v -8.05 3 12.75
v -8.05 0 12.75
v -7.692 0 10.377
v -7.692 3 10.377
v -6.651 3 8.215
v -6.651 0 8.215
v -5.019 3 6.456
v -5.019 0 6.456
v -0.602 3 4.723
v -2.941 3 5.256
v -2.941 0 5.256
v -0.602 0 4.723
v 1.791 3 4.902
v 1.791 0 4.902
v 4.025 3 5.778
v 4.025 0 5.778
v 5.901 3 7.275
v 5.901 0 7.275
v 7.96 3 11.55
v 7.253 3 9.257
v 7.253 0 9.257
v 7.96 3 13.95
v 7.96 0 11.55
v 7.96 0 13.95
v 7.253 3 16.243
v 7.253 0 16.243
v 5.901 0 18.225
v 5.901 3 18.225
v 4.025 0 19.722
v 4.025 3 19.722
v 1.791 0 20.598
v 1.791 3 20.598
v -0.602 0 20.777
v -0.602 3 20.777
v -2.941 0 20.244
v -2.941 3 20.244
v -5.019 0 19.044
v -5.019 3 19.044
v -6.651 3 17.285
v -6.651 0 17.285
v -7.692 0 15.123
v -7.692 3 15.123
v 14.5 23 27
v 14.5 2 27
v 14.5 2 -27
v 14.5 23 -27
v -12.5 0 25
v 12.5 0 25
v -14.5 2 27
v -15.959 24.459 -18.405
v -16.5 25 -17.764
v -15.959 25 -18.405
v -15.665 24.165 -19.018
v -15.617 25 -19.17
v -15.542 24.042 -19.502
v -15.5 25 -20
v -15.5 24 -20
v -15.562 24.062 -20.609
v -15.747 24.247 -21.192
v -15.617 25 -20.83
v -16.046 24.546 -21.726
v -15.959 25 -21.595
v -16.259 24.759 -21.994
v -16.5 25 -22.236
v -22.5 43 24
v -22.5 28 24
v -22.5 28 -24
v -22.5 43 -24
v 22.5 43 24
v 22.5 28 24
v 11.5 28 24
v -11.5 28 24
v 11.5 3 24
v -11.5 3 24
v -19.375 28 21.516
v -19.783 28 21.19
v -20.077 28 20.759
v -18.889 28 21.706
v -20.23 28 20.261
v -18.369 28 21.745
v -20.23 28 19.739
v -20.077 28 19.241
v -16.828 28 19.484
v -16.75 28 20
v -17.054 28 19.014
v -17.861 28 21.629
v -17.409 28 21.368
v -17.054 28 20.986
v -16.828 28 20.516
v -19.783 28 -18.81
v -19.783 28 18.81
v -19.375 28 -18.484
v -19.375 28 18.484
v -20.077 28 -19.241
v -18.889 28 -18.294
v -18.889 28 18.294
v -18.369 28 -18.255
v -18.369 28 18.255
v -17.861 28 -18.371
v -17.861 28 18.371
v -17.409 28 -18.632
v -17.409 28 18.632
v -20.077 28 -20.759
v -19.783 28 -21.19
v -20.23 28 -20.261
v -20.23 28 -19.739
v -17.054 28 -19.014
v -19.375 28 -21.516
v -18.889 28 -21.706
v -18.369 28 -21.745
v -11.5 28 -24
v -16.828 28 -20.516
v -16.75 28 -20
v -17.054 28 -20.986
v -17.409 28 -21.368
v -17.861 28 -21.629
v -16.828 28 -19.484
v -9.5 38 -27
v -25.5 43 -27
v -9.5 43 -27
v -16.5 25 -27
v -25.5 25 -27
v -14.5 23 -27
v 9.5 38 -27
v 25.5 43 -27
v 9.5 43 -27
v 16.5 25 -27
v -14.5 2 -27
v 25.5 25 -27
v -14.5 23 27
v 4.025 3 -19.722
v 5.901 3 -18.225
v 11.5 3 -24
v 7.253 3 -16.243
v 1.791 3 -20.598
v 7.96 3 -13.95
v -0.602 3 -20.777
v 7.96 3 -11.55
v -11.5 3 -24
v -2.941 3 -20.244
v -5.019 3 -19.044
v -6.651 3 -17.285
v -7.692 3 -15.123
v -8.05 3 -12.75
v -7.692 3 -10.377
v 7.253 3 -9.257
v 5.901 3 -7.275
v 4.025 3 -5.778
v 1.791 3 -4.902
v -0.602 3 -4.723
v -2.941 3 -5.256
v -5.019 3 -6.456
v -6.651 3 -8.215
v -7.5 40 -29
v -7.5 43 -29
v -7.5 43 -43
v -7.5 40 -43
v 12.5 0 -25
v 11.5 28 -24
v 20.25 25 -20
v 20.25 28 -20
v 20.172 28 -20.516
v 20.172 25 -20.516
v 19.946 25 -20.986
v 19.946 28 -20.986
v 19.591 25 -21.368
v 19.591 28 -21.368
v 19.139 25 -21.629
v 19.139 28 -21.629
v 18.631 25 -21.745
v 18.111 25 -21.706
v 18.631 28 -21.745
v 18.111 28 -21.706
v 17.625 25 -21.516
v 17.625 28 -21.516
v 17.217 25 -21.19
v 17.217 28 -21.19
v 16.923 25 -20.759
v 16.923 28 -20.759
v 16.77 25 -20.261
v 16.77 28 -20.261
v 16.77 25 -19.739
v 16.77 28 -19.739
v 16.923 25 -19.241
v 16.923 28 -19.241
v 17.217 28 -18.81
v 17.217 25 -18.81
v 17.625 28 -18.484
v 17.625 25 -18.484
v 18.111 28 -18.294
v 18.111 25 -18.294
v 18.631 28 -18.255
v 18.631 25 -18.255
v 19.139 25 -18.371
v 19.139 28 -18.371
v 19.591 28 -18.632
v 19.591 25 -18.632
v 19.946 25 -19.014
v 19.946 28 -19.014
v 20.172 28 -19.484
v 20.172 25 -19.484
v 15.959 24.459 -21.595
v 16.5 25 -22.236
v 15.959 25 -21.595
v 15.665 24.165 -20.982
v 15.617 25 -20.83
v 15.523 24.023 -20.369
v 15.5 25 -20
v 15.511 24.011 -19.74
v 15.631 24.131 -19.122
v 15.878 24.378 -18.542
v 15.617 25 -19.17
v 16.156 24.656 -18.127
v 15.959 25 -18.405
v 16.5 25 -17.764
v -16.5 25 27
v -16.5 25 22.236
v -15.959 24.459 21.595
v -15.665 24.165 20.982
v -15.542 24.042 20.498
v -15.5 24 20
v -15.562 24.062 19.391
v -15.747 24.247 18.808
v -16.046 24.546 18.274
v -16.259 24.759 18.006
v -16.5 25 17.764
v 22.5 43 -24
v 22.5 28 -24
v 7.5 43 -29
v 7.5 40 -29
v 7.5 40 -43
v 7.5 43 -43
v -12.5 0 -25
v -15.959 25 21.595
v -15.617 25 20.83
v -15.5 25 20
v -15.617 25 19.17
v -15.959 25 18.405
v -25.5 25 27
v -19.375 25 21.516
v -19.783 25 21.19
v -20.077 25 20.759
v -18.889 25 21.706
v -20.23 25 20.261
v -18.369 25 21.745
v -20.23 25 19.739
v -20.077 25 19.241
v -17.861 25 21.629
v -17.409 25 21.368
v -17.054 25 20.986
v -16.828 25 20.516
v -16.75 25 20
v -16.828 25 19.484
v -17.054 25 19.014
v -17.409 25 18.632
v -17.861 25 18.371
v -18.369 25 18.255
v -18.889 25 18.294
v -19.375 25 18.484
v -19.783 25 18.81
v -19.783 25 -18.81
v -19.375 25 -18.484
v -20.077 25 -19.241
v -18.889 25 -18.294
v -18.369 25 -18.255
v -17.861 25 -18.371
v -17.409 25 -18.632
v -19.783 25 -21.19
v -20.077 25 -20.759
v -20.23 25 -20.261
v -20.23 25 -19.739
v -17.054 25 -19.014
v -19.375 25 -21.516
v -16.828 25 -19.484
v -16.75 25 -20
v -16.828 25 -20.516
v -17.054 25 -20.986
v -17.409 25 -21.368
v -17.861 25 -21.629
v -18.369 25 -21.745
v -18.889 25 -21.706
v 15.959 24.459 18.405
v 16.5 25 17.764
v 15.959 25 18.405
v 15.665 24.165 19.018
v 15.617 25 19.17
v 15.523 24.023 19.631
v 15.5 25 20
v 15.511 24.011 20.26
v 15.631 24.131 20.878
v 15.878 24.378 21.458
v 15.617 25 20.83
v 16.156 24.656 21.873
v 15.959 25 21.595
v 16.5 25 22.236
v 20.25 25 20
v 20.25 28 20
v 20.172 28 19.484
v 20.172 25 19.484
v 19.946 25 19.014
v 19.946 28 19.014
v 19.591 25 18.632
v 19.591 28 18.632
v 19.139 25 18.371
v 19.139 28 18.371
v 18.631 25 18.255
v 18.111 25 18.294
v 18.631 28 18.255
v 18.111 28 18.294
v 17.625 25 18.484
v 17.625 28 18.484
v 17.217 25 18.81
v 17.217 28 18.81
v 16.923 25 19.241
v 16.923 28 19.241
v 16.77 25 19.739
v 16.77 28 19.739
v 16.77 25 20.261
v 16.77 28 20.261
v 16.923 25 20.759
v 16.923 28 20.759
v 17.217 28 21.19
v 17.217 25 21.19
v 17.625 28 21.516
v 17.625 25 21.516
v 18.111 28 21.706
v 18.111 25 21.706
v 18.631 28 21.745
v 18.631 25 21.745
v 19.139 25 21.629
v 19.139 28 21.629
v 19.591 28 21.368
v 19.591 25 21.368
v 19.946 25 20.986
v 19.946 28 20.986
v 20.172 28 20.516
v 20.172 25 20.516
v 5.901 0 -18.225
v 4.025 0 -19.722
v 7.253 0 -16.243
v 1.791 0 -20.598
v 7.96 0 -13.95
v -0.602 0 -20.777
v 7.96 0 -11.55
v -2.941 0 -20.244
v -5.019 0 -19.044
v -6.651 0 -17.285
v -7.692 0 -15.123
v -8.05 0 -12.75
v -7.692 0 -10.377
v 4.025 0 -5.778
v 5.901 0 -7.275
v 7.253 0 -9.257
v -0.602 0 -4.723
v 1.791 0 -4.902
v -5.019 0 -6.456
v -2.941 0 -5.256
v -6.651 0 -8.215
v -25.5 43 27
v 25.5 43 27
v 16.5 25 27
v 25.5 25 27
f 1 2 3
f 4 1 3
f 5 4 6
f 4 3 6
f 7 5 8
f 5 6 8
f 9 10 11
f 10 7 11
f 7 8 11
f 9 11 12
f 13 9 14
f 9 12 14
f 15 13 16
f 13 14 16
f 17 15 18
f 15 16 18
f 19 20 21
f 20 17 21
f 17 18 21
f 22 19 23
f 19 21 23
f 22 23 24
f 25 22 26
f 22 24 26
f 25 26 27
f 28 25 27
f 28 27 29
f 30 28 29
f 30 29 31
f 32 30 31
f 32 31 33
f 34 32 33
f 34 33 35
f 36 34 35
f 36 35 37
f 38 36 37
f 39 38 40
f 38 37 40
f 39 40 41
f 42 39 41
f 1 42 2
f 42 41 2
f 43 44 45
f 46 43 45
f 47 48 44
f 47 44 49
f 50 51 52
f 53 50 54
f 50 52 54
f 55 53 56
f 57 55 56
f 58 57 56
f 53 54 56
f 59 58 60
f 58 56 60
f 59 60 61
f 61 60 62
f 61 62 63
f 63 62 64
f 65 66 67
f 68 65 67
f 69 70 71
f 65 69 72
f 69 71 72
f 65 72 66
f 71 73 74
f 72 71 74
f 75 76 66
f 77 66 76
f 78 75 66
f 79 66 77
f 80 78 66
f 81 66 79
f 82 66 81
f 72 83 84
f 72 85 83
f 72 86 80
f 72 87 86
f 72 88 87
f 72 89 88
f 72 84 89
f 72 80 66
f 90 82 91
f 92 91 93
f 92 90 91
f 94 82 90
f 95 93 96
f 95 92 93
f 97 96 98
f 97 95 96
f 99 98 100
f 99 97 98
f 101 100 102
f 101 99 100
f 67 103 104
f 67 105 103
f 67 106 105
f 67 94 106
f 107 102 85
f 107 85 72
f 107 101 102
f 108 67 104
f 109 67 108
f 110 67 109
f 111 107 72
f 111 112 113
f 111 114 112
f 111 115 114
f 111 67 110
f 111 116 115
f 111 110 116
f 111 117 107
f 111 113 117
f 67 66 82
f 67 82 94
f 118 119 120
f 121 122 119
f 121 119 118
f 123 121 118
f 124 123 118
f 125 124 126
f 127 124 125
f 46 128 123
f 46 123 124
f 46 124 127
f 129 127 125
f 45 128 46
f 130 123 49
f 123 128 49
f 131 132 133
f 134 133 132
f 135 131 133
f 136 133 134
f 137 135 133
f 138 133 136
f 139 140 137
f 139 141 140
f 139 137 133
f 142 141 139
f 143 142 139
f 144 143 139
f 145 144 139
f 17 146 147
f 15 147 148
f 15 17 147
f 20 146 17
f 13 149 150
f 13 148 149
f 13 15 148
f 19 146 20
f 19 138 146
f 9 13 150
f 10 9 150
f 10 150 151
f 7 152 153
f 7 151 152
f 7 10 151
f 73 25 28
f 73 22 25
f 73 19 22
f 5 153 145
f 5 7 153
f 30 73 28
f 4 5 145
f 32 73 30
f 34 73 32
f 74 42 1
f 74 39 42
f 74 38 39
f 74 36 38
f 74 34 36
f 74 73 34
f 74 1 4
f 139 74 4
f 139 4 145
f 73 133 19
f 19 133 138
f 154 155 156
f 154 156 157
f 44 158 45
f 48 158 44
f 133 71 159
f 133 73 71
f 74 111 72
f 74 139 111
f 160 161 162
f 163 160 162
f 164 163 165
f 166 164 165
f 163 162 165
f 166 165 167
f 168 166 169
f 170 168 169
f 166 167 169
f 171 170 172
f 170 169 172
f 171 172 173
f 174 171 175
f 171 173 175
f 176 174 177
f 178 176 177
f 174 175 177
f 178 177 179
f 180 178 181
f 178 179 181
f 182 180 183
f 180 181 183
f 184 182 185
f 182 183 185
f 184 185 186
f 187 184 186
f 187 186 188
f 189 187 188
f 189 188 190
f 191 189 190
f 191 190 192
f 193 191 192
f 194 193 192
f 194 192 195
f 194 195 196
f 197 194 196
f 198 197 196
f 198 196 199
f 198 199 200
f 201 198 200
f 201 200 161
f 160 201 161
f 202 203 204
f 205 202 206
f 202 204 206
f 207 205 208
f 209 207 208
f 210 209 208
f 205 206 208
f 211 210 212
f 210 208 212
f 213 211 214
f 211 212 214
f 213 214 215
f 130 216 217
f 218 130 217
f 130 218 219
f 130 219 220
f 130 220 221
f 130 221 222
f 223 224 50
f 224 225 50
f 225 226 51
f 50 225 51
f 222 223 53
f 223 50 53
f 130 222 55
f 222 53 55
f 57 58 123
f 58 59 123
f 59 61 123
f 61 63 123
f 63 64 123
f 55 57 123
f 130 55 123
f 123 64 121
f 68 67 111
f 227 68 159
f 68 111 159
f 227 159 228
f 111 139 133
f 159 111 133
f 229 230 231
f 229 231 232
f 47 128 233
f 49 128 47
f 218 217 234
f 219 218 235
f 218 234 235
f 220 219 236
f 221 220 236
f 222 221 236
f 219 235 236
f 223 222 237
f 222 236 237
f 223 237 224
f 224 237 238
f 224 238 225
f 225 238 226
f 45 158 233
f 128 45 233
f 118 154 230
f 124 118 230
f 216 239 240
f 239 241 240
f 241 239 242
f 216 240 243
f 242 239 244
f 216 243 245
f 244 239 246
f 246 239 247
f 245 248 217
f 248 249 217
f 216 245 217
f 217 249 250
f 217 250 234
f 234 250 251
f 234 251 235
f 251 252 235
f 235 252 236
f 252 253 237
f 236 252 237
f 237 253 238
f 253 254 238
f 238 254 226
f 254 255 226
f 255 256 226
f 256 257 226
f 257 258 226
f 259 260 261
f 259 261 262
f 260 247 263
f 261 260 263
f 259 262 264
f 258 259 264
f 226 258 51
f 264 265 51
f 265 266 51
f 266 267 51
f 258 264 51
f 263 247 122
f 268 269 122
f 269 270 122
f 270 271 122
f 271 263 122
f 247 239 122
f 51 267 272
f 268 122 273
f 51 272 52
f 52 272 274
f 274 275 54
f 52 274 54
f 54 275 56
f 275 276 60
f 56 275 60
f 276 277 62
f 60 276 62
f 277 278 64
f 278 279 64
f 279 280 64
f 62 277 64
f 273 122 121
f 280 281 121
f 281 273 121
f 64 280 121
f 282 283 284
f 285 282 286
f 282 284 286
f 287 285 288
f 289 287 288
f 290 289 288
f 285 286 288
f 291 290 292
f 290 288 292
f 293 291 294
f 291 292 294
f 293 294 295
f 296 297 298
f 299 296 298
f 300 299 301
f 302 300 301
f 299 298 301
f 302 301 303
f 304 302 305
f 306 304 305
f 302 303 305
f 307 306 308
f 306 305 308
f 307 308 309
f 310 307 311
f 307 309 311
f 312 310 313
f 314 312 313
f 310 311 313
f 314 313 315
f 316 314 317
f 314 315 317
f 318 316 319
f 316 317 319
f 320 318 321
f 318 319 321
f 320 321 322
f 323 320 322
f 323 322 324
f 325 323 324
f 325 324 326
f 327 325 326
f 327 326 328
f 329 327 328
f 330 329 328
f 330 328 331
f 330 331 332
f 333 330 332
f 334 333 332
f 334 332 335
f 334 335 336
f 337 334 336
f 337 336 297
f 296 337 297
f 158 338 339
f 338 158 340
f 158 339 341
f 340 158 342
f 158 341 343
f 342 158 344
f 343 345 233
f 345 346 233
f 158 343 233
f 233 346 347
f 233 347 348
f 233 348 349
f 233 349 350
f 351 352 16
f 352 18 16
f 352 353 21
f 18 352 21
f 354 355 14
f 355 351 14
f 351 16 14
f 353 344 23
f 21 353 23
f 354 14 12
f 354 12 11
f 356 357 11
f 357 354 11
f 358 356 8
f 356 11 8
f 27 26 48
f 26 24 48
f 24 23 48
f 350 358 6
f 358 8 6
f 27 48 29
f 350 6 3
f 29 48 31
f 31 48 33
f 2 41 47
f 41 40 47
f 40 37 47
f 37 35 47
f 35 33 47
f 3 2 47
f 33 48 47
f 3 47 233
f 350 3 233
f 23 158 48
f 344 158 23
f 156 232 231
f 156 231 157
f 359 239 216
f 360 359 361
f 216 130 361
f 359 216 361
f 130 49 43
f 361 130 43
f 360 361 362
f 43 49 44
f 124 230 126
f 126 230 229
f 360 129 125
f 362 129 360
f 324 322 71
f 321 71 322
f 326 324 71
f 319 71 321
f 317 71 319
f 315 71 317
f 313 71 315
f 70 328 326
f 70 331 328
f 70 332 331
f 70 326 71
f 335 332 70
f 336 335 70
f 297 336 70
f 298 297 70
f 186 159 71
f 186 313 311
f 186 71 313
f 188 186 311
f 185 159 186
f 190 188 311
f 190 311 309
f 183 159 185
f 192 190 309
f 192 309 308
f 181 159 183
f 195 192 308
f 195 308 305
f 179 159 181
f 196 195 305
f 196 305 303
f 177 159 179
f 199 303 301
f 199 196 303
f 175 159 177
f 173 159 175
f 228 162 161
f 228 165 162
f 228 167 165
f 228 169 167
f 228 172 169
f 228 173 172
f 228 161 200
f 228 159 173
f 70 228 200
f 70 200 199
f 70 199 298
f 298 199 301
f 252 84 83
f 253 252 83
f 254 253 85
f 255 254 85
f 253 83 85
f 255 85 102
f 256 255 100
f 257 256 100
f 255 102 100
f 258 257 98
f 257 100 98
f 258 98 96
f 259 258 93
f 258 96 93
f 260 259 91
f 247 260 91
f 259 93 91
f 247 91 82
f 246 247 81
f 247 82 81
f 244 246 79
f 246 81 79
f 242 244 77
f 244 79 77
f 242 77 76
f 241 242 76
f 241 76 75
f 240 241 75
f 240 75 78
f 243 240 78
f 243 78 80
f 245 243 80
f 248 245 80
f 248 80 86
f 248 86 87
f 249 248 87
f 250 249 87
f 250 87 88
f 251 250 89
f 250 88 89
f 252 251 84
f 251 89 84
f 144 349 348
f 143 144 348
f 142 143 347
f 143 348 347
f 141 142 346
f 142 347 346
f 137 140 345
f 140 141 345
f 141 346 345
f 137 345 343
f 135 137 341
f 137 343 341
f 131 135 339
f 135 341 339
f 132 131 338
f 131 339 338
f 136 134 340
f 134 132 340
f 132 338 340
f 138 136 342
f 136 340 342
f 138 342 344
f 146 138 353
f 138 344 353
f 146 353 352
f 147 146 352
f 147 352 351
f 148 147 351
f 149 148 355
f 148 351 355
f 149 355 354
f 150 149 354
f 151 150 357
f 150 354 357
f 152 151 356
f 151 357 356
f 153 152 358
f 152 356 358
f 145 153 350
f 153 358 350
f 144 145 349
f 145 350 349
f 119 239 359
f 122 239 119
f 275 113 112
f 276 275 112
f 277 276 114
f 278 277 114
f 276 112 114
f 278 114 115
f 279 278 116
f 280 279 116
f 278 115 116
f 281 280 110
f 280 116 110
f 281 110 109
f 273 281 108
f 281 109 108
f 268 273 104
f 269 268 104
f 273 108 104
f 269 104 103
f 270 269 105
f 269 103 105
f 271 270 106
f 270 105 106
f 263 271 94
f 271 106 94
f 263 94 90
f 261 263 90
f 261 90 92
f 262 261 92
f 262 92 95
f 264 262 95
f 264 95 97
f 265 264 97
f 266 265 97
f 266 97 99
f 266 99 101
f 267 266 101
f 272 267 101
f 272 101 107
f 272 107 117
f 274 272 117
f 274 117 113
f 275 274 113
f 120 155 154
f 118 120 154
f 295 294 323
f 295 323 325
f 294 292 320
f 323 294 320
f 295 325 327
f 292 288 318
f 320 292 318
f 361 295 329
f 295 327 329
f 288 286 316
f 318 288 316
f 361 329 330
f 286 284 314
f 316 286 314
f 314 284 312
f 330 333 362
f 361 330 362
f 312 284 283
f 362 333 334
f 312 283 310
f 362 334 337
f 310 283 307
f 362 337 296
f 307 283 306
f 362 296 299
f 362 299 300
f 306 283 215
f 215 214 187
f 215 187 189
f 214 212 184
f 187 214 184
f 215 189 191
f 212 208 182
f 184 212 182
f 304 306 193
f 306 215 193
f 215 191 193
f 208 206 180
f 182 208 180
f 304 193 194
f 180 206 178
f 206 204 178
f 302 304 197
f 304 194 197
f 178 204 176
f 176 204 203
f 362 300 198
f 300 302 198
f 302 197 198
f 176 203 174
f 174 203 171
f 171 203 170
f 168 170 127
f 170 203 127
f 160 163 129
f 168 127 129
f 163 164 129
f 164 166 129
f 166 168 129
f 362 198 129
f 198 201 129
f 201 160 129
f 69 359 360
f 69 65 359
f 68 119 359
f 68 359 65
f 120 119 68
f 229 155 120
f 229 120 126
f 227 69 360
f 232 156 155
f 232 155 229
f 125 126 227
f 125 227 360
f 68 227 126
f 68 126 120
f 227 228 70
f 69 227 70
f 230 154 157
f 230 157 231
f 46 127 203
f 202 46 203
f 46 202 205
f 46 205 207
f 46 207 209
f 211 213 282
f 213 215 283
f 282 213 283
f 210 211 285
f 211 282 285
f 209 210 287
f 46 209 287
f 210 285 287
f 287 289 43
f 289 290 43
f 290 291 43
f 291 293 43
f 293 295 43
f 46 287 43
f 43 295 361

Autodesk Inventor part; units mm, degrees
ref_plane "YZ Plane" through (0, 0, 0) normal (1, 0, 0) x (0, 1, 0)
ref_plane "XZ Plane" through (0, 0, 0) normal (0, 1, 0) x (-1, 0, 0)
ref_plane "XY Plane" through (0, 0, 0) normal (0, 0, 1) x (1, 0, 0)
sketch "Sketch1" plane through (0, 0, 0) normal (0, 1, 0) x (-1, 0, 0)
  circle A0 centre (0, 12.75) radius 8.05
  circle A1 centre (0, -12.75) radius 8.05
  line L0 (14.5, 27) -> (-14.5, 27)
  line L1 (-14.5, 27) -> (-14.5, -27)
  line L2 (-14.5, -27) -> (14.5, -27)
  line L3 (14.5, -27) -> (14.5, 27)
  line L4 (14.5, 27) -> (-14.5, -27) construction
  line L5 (-14.5, 27) -> (14.5, -27) construction
  point P0 (0, 0)
  dimension "d0" = 16.1
  dimension "d1" = 16.1
  dimension "d2" = 25.5
  dimension "d3" = 29
  dimension "d4" = 54
  dimension "d5" = 14.5
  dimension "d6" = 14.5
  dimension "d7" = 14.25
  dimension "d8" = 14.25
extrude "Extrusion1" add sketch "Sketch1" along normal blind 3
sketch "Sketch2" plane through (0, 3, 0) normal (0, 1, 0) x (1, 0, 0)
  line L0 (-11.5, -24) -> (11.5, -24)
  line L1 (11.5, -24) -> (11.5, 24)
  line L2 (11.5, 24) -> (-11.5, 24)
  line L3 (-11.5, 24) -> (-11.5, -24)
  line L4 (-11.5, -24) -> (11.5, 24) construction
  line L5 (11.5, -24) -> (-11.5, 24) construction
  line L6 (14.5, -27) -> (14.5, 27) projected
  line L7 (-14.5, -27) -> (14.5, -27)
  line L8 (14.5, -27) -> (14.5, 27)
  line L9 (14.5, 27) -> (-14.5, 27)
  line L10 (-14.5, 27) -> (-14.5, -27)
  line L11 (-14.5, -27) -> (14.5, 27) construction
  line L12 (14.5, -27) -> (-14.5, 27) construction
  point P0 (0, 0)
  dimension "d11" = 23
  dimension "d12" = 48
extrude "Extrusion2" add sketch "Sketch2" along normal blind 25
sketch "Sketch3" plane through (0, 28, 0) normal (0, 1, 0) x (1, 0, 0)
  line L0 (-25.5, 27) -> (25.5, 27)
  line L1 (25.5, 27) -> (25.5, -27)
  line L2 (25.5, -27) -> (-25.5, -27)
  line L3 (-25.5, -27) -> (-25.5, 27)
  line L4 (-25.5, 27) -> (25.5, -27) construction
  line L5 (25.5, 27) -> (-25.5, -27) construction
  line L6 (14.5, -27) -> (14.5, 27) projected
  line L7 (-14.5, 27) -> (14.5, 27)
  line L8 (14.5, 27) -> (14.5, -27)
  line L9 (14.5, -27) -> (-14.5, -27)
  line L10 (-14.5, -27) -> (-14.5, 27)
  line L11 (-14.5, 27) -> (14.5, -27) construction
  line L12 (14.5, 27) -> (-14.5, -27) construction
  point P0 (0, 0)
  dimension "d15" = 51
extrude "Extrusion3" add sketch "Sketch3" against normal blind 3 contours L0 L10 L2 L3 | L0 L1 L2 L6
sketch "Sketch4" plane through (0, 28, 0) normal (0, 1, 0) x (1, 0, 0)
  line L0 (-25.5, -27) -> (25.5, -27) projected
  line L1 (-25.5, 27) -> (25.5, 27)
  line L2 (25.5, 27) -> (25.5, -27)
  line L3 (25.5, -27) -> (-25.5, -27)
  line L4 (-25.5, -27) -> (-25.5, 27)
  line L5 (-25.5, 27) -> (25.5, -27) construction
  line L6 (25.5, 27) -> (-25.5, -27) construction
  line L7 (-22.5, 24) -> (22.5, 24)
  line L8 (22.5, 24) -> (22.5, -24)
  line L9 (22.5, -24) -> (-22.5, -24)
  line L10 (-22.5, -24) -> (-22.5, 24)
  line L11 (-22.5, 24) -> (22.5, -24) construction
  line L12 (22.5, 24) -> (-22.5, -24) construction
  point P0 (0, 0)
  dimension "d18" = 45
  dimension "d19" = 48
extrude "Extrusion4" add sketch "Sketch4" along normal blind 15
sketch "Sketch5" plane through (0, 28, 0) normal (0, 1, 0) x (1, 0, 0)
  line L0 (-11.5, 24) -> (-22.5, 24) projected
  line L1 (-22.5, 24) -> (-22.5, -24) projected
  line L2 (-22.5, -24) -> (-11.5, -24) projected
  line L3 (-11.5, -24) -> (-11.5, 24) projected
  line L4 (22.5, 24) -> (11.5, 24) projected
  line L5 (11.5, 24) -> (11.5, -24) projected
  line L6 (11.5, -24) -> (22.5, -24) projected
  line L7 (22.5, -24) -> (22.5, 24) projected
  circle A0 centre (18.5, 20) radius 1.75
  line L8 (14.5, 27) -> (14.5, -27) projected
  line L9 (14.5, 27) -> (25.5, 27) projected
  line L10 (25.5, 27) -> (25.5, -27) projected
  line L11 (25.5, -27) -> (14.5, -27) projected
  line L12 (-11.5, 24) -> (-11.5, -24) projected
  line L13 (-11.5, -24) -> (11.5, -24) projected
  line L14 (11.5, -24) -> (11.5, 24) projected
  line L15 (11.5, 24) -> (-11.5, 24) projected
  circle A1 centre (0, 12.75) radius 8.05 projected
  circle A2 centre (0, -12.75) radius 8.05 projected
  circle A3 centre (18.5, -20) radius 1.75
  circle A4 centre (-18.5, 20) radius 1.75
  circle A5 centre (-18.5, -20) radius 1.75
  point P0 (0, 0)
  dimension "d22" = 3.5
  dimension "d23" = 4
  dimension "d24" = 4
  dimension "d25" = 4
  dimension "d28" = 40
  dimension "d31" = 37
  dimension "d53" = 4
extrude "Extrusion5" cut sketch "Sketch5" against normal blind 10 contours A0 | A3 | A4 | A5
chamfer "Chamfer1" distance 2 angle 45 4 edges at (-14.5, 0, 0) (14.5, 0, 0) (0, 0, 27) (0, 0, -27)
chamfer "Chamfer2" distance 2 angle 45 2 edges at (-14.5, 25, 0) (14.5, 25, 0)
sketch "Sketch6" plane through (0, 25, 0) normal (0, -1, 0) x (1, 0, 0)
  line L0 (-16.5, 27) -> (-16.5, -27) projected
  circle A0 centre (-18.5, -20) radius 1.75 projected
  circle A1 centre (-18.5, 20) radius 1.75 projected
  line L1 (-16.5, 27) -> (-25.5, 27) projected
  line L2 (-25.5, 27) -> (-25.5, -27) projected
  line L3 (-25.5, -27) -> (-16.5, -27) projected
  line L4 (16.5, -27) -> (16.5, 27) projected
  circle A2 centre (18.5, -20) radius 1.75 projected
  line L5 (16.5, -27) -> (25.5, -27) projected
  line L6 (25.5, -27) -> (25.5, 27) projected
  line L7 (25.5, 27) -> (16.5, 27) projected
  circle A3 centre (18.5, 20) radius 1.75 projected
  circle A4 centre (18.5, -20) radius 3
  circle A5 centre (18.5, 20) radius 3
  circle A6 centre (-18.5, -20) radius 3
  circle A7 centre (-18.5, 20) radius 3
  point P0 (0, 0)
  dimension "d42" = 6
  dimension "d45" = 40
  dimension "d48" = 37
extrude "Extrusion6" cut sketch "Sketch6" along normal blind 10 contours A7 L0 | L0 A7 | A6 L0 | L0 A6 | A0 | A1 | A4 L4 | L4 A4 | A5 L4 | L4 A5 | A2 | A3
sketch "Sketch7" plane through (25.5, 43, -27) normal (0, 0, -1) x (-1, 0, 0)
  line L0 (40, -41) -> (11, -41) projected
  line L1 (40, -41) -> (40, -20) projected
  line L2 (42, -18) -> (40, -20) projected
  line L3 (51, -18) -> (42, -18) projected
  line L4 (51, 0) -> (51, -18) projected
  line L5 (0, 0) -> (51, 0) projected
  line L6 (0, -18) -> (0, 0) projected
  line L7 (9, -18) -> (0, -18) projected
  line L8 (11, -20) -> (9, -18) projected
  line L9 (11, -41) -> (11, -20) projected
  line L10 (0, 0) -> (51, 0) projected
  line L11 (18, 0) -> (33, 0)
  line L12 (33, 0) -> (33, -3)
  line L13 (33, -3) -> (18, -3)
  line L14 (18, -3) -> (18, 0)
  point P0 (25.5, -43)
  dimension "d54" = 15
  dimension "d55" = 3
  dimension "d56" = 18
  dimension "d57" = 18
extrude "Extrusion7" add sketch "Sketch7" along normal blind 16 contours L12 L13 L14 L5
chamfer "Chamfer3" distance 2 angle 45 3 edges at (0, 40, -27) (-7.5, 41.5, -27) (7.5, 41.5, -27)
sketch "Sketch8" plane through (-7.5, 40, -43) normal (0, -1, 0) x (1, 0, 0)
  line L0 (0, 14) -> (15, 14) projected
  line L1 (0, 14) -> (0, 0) projected
  line L2 (15, 0) -> (0, 0) projected
  line L3 (15, 14) -> (15, 0) projected
  circle A0 centre (7.5, 7) radius 3
  point P0 (7.5, 43)
  dimension "d63" = 6
equation "\"d7\" = d8"
equation "\"d23\" = d24"
equation "\"d25\" = d53"
equation "\"d56\" = d57"
properties part number "obudowa_baza"
